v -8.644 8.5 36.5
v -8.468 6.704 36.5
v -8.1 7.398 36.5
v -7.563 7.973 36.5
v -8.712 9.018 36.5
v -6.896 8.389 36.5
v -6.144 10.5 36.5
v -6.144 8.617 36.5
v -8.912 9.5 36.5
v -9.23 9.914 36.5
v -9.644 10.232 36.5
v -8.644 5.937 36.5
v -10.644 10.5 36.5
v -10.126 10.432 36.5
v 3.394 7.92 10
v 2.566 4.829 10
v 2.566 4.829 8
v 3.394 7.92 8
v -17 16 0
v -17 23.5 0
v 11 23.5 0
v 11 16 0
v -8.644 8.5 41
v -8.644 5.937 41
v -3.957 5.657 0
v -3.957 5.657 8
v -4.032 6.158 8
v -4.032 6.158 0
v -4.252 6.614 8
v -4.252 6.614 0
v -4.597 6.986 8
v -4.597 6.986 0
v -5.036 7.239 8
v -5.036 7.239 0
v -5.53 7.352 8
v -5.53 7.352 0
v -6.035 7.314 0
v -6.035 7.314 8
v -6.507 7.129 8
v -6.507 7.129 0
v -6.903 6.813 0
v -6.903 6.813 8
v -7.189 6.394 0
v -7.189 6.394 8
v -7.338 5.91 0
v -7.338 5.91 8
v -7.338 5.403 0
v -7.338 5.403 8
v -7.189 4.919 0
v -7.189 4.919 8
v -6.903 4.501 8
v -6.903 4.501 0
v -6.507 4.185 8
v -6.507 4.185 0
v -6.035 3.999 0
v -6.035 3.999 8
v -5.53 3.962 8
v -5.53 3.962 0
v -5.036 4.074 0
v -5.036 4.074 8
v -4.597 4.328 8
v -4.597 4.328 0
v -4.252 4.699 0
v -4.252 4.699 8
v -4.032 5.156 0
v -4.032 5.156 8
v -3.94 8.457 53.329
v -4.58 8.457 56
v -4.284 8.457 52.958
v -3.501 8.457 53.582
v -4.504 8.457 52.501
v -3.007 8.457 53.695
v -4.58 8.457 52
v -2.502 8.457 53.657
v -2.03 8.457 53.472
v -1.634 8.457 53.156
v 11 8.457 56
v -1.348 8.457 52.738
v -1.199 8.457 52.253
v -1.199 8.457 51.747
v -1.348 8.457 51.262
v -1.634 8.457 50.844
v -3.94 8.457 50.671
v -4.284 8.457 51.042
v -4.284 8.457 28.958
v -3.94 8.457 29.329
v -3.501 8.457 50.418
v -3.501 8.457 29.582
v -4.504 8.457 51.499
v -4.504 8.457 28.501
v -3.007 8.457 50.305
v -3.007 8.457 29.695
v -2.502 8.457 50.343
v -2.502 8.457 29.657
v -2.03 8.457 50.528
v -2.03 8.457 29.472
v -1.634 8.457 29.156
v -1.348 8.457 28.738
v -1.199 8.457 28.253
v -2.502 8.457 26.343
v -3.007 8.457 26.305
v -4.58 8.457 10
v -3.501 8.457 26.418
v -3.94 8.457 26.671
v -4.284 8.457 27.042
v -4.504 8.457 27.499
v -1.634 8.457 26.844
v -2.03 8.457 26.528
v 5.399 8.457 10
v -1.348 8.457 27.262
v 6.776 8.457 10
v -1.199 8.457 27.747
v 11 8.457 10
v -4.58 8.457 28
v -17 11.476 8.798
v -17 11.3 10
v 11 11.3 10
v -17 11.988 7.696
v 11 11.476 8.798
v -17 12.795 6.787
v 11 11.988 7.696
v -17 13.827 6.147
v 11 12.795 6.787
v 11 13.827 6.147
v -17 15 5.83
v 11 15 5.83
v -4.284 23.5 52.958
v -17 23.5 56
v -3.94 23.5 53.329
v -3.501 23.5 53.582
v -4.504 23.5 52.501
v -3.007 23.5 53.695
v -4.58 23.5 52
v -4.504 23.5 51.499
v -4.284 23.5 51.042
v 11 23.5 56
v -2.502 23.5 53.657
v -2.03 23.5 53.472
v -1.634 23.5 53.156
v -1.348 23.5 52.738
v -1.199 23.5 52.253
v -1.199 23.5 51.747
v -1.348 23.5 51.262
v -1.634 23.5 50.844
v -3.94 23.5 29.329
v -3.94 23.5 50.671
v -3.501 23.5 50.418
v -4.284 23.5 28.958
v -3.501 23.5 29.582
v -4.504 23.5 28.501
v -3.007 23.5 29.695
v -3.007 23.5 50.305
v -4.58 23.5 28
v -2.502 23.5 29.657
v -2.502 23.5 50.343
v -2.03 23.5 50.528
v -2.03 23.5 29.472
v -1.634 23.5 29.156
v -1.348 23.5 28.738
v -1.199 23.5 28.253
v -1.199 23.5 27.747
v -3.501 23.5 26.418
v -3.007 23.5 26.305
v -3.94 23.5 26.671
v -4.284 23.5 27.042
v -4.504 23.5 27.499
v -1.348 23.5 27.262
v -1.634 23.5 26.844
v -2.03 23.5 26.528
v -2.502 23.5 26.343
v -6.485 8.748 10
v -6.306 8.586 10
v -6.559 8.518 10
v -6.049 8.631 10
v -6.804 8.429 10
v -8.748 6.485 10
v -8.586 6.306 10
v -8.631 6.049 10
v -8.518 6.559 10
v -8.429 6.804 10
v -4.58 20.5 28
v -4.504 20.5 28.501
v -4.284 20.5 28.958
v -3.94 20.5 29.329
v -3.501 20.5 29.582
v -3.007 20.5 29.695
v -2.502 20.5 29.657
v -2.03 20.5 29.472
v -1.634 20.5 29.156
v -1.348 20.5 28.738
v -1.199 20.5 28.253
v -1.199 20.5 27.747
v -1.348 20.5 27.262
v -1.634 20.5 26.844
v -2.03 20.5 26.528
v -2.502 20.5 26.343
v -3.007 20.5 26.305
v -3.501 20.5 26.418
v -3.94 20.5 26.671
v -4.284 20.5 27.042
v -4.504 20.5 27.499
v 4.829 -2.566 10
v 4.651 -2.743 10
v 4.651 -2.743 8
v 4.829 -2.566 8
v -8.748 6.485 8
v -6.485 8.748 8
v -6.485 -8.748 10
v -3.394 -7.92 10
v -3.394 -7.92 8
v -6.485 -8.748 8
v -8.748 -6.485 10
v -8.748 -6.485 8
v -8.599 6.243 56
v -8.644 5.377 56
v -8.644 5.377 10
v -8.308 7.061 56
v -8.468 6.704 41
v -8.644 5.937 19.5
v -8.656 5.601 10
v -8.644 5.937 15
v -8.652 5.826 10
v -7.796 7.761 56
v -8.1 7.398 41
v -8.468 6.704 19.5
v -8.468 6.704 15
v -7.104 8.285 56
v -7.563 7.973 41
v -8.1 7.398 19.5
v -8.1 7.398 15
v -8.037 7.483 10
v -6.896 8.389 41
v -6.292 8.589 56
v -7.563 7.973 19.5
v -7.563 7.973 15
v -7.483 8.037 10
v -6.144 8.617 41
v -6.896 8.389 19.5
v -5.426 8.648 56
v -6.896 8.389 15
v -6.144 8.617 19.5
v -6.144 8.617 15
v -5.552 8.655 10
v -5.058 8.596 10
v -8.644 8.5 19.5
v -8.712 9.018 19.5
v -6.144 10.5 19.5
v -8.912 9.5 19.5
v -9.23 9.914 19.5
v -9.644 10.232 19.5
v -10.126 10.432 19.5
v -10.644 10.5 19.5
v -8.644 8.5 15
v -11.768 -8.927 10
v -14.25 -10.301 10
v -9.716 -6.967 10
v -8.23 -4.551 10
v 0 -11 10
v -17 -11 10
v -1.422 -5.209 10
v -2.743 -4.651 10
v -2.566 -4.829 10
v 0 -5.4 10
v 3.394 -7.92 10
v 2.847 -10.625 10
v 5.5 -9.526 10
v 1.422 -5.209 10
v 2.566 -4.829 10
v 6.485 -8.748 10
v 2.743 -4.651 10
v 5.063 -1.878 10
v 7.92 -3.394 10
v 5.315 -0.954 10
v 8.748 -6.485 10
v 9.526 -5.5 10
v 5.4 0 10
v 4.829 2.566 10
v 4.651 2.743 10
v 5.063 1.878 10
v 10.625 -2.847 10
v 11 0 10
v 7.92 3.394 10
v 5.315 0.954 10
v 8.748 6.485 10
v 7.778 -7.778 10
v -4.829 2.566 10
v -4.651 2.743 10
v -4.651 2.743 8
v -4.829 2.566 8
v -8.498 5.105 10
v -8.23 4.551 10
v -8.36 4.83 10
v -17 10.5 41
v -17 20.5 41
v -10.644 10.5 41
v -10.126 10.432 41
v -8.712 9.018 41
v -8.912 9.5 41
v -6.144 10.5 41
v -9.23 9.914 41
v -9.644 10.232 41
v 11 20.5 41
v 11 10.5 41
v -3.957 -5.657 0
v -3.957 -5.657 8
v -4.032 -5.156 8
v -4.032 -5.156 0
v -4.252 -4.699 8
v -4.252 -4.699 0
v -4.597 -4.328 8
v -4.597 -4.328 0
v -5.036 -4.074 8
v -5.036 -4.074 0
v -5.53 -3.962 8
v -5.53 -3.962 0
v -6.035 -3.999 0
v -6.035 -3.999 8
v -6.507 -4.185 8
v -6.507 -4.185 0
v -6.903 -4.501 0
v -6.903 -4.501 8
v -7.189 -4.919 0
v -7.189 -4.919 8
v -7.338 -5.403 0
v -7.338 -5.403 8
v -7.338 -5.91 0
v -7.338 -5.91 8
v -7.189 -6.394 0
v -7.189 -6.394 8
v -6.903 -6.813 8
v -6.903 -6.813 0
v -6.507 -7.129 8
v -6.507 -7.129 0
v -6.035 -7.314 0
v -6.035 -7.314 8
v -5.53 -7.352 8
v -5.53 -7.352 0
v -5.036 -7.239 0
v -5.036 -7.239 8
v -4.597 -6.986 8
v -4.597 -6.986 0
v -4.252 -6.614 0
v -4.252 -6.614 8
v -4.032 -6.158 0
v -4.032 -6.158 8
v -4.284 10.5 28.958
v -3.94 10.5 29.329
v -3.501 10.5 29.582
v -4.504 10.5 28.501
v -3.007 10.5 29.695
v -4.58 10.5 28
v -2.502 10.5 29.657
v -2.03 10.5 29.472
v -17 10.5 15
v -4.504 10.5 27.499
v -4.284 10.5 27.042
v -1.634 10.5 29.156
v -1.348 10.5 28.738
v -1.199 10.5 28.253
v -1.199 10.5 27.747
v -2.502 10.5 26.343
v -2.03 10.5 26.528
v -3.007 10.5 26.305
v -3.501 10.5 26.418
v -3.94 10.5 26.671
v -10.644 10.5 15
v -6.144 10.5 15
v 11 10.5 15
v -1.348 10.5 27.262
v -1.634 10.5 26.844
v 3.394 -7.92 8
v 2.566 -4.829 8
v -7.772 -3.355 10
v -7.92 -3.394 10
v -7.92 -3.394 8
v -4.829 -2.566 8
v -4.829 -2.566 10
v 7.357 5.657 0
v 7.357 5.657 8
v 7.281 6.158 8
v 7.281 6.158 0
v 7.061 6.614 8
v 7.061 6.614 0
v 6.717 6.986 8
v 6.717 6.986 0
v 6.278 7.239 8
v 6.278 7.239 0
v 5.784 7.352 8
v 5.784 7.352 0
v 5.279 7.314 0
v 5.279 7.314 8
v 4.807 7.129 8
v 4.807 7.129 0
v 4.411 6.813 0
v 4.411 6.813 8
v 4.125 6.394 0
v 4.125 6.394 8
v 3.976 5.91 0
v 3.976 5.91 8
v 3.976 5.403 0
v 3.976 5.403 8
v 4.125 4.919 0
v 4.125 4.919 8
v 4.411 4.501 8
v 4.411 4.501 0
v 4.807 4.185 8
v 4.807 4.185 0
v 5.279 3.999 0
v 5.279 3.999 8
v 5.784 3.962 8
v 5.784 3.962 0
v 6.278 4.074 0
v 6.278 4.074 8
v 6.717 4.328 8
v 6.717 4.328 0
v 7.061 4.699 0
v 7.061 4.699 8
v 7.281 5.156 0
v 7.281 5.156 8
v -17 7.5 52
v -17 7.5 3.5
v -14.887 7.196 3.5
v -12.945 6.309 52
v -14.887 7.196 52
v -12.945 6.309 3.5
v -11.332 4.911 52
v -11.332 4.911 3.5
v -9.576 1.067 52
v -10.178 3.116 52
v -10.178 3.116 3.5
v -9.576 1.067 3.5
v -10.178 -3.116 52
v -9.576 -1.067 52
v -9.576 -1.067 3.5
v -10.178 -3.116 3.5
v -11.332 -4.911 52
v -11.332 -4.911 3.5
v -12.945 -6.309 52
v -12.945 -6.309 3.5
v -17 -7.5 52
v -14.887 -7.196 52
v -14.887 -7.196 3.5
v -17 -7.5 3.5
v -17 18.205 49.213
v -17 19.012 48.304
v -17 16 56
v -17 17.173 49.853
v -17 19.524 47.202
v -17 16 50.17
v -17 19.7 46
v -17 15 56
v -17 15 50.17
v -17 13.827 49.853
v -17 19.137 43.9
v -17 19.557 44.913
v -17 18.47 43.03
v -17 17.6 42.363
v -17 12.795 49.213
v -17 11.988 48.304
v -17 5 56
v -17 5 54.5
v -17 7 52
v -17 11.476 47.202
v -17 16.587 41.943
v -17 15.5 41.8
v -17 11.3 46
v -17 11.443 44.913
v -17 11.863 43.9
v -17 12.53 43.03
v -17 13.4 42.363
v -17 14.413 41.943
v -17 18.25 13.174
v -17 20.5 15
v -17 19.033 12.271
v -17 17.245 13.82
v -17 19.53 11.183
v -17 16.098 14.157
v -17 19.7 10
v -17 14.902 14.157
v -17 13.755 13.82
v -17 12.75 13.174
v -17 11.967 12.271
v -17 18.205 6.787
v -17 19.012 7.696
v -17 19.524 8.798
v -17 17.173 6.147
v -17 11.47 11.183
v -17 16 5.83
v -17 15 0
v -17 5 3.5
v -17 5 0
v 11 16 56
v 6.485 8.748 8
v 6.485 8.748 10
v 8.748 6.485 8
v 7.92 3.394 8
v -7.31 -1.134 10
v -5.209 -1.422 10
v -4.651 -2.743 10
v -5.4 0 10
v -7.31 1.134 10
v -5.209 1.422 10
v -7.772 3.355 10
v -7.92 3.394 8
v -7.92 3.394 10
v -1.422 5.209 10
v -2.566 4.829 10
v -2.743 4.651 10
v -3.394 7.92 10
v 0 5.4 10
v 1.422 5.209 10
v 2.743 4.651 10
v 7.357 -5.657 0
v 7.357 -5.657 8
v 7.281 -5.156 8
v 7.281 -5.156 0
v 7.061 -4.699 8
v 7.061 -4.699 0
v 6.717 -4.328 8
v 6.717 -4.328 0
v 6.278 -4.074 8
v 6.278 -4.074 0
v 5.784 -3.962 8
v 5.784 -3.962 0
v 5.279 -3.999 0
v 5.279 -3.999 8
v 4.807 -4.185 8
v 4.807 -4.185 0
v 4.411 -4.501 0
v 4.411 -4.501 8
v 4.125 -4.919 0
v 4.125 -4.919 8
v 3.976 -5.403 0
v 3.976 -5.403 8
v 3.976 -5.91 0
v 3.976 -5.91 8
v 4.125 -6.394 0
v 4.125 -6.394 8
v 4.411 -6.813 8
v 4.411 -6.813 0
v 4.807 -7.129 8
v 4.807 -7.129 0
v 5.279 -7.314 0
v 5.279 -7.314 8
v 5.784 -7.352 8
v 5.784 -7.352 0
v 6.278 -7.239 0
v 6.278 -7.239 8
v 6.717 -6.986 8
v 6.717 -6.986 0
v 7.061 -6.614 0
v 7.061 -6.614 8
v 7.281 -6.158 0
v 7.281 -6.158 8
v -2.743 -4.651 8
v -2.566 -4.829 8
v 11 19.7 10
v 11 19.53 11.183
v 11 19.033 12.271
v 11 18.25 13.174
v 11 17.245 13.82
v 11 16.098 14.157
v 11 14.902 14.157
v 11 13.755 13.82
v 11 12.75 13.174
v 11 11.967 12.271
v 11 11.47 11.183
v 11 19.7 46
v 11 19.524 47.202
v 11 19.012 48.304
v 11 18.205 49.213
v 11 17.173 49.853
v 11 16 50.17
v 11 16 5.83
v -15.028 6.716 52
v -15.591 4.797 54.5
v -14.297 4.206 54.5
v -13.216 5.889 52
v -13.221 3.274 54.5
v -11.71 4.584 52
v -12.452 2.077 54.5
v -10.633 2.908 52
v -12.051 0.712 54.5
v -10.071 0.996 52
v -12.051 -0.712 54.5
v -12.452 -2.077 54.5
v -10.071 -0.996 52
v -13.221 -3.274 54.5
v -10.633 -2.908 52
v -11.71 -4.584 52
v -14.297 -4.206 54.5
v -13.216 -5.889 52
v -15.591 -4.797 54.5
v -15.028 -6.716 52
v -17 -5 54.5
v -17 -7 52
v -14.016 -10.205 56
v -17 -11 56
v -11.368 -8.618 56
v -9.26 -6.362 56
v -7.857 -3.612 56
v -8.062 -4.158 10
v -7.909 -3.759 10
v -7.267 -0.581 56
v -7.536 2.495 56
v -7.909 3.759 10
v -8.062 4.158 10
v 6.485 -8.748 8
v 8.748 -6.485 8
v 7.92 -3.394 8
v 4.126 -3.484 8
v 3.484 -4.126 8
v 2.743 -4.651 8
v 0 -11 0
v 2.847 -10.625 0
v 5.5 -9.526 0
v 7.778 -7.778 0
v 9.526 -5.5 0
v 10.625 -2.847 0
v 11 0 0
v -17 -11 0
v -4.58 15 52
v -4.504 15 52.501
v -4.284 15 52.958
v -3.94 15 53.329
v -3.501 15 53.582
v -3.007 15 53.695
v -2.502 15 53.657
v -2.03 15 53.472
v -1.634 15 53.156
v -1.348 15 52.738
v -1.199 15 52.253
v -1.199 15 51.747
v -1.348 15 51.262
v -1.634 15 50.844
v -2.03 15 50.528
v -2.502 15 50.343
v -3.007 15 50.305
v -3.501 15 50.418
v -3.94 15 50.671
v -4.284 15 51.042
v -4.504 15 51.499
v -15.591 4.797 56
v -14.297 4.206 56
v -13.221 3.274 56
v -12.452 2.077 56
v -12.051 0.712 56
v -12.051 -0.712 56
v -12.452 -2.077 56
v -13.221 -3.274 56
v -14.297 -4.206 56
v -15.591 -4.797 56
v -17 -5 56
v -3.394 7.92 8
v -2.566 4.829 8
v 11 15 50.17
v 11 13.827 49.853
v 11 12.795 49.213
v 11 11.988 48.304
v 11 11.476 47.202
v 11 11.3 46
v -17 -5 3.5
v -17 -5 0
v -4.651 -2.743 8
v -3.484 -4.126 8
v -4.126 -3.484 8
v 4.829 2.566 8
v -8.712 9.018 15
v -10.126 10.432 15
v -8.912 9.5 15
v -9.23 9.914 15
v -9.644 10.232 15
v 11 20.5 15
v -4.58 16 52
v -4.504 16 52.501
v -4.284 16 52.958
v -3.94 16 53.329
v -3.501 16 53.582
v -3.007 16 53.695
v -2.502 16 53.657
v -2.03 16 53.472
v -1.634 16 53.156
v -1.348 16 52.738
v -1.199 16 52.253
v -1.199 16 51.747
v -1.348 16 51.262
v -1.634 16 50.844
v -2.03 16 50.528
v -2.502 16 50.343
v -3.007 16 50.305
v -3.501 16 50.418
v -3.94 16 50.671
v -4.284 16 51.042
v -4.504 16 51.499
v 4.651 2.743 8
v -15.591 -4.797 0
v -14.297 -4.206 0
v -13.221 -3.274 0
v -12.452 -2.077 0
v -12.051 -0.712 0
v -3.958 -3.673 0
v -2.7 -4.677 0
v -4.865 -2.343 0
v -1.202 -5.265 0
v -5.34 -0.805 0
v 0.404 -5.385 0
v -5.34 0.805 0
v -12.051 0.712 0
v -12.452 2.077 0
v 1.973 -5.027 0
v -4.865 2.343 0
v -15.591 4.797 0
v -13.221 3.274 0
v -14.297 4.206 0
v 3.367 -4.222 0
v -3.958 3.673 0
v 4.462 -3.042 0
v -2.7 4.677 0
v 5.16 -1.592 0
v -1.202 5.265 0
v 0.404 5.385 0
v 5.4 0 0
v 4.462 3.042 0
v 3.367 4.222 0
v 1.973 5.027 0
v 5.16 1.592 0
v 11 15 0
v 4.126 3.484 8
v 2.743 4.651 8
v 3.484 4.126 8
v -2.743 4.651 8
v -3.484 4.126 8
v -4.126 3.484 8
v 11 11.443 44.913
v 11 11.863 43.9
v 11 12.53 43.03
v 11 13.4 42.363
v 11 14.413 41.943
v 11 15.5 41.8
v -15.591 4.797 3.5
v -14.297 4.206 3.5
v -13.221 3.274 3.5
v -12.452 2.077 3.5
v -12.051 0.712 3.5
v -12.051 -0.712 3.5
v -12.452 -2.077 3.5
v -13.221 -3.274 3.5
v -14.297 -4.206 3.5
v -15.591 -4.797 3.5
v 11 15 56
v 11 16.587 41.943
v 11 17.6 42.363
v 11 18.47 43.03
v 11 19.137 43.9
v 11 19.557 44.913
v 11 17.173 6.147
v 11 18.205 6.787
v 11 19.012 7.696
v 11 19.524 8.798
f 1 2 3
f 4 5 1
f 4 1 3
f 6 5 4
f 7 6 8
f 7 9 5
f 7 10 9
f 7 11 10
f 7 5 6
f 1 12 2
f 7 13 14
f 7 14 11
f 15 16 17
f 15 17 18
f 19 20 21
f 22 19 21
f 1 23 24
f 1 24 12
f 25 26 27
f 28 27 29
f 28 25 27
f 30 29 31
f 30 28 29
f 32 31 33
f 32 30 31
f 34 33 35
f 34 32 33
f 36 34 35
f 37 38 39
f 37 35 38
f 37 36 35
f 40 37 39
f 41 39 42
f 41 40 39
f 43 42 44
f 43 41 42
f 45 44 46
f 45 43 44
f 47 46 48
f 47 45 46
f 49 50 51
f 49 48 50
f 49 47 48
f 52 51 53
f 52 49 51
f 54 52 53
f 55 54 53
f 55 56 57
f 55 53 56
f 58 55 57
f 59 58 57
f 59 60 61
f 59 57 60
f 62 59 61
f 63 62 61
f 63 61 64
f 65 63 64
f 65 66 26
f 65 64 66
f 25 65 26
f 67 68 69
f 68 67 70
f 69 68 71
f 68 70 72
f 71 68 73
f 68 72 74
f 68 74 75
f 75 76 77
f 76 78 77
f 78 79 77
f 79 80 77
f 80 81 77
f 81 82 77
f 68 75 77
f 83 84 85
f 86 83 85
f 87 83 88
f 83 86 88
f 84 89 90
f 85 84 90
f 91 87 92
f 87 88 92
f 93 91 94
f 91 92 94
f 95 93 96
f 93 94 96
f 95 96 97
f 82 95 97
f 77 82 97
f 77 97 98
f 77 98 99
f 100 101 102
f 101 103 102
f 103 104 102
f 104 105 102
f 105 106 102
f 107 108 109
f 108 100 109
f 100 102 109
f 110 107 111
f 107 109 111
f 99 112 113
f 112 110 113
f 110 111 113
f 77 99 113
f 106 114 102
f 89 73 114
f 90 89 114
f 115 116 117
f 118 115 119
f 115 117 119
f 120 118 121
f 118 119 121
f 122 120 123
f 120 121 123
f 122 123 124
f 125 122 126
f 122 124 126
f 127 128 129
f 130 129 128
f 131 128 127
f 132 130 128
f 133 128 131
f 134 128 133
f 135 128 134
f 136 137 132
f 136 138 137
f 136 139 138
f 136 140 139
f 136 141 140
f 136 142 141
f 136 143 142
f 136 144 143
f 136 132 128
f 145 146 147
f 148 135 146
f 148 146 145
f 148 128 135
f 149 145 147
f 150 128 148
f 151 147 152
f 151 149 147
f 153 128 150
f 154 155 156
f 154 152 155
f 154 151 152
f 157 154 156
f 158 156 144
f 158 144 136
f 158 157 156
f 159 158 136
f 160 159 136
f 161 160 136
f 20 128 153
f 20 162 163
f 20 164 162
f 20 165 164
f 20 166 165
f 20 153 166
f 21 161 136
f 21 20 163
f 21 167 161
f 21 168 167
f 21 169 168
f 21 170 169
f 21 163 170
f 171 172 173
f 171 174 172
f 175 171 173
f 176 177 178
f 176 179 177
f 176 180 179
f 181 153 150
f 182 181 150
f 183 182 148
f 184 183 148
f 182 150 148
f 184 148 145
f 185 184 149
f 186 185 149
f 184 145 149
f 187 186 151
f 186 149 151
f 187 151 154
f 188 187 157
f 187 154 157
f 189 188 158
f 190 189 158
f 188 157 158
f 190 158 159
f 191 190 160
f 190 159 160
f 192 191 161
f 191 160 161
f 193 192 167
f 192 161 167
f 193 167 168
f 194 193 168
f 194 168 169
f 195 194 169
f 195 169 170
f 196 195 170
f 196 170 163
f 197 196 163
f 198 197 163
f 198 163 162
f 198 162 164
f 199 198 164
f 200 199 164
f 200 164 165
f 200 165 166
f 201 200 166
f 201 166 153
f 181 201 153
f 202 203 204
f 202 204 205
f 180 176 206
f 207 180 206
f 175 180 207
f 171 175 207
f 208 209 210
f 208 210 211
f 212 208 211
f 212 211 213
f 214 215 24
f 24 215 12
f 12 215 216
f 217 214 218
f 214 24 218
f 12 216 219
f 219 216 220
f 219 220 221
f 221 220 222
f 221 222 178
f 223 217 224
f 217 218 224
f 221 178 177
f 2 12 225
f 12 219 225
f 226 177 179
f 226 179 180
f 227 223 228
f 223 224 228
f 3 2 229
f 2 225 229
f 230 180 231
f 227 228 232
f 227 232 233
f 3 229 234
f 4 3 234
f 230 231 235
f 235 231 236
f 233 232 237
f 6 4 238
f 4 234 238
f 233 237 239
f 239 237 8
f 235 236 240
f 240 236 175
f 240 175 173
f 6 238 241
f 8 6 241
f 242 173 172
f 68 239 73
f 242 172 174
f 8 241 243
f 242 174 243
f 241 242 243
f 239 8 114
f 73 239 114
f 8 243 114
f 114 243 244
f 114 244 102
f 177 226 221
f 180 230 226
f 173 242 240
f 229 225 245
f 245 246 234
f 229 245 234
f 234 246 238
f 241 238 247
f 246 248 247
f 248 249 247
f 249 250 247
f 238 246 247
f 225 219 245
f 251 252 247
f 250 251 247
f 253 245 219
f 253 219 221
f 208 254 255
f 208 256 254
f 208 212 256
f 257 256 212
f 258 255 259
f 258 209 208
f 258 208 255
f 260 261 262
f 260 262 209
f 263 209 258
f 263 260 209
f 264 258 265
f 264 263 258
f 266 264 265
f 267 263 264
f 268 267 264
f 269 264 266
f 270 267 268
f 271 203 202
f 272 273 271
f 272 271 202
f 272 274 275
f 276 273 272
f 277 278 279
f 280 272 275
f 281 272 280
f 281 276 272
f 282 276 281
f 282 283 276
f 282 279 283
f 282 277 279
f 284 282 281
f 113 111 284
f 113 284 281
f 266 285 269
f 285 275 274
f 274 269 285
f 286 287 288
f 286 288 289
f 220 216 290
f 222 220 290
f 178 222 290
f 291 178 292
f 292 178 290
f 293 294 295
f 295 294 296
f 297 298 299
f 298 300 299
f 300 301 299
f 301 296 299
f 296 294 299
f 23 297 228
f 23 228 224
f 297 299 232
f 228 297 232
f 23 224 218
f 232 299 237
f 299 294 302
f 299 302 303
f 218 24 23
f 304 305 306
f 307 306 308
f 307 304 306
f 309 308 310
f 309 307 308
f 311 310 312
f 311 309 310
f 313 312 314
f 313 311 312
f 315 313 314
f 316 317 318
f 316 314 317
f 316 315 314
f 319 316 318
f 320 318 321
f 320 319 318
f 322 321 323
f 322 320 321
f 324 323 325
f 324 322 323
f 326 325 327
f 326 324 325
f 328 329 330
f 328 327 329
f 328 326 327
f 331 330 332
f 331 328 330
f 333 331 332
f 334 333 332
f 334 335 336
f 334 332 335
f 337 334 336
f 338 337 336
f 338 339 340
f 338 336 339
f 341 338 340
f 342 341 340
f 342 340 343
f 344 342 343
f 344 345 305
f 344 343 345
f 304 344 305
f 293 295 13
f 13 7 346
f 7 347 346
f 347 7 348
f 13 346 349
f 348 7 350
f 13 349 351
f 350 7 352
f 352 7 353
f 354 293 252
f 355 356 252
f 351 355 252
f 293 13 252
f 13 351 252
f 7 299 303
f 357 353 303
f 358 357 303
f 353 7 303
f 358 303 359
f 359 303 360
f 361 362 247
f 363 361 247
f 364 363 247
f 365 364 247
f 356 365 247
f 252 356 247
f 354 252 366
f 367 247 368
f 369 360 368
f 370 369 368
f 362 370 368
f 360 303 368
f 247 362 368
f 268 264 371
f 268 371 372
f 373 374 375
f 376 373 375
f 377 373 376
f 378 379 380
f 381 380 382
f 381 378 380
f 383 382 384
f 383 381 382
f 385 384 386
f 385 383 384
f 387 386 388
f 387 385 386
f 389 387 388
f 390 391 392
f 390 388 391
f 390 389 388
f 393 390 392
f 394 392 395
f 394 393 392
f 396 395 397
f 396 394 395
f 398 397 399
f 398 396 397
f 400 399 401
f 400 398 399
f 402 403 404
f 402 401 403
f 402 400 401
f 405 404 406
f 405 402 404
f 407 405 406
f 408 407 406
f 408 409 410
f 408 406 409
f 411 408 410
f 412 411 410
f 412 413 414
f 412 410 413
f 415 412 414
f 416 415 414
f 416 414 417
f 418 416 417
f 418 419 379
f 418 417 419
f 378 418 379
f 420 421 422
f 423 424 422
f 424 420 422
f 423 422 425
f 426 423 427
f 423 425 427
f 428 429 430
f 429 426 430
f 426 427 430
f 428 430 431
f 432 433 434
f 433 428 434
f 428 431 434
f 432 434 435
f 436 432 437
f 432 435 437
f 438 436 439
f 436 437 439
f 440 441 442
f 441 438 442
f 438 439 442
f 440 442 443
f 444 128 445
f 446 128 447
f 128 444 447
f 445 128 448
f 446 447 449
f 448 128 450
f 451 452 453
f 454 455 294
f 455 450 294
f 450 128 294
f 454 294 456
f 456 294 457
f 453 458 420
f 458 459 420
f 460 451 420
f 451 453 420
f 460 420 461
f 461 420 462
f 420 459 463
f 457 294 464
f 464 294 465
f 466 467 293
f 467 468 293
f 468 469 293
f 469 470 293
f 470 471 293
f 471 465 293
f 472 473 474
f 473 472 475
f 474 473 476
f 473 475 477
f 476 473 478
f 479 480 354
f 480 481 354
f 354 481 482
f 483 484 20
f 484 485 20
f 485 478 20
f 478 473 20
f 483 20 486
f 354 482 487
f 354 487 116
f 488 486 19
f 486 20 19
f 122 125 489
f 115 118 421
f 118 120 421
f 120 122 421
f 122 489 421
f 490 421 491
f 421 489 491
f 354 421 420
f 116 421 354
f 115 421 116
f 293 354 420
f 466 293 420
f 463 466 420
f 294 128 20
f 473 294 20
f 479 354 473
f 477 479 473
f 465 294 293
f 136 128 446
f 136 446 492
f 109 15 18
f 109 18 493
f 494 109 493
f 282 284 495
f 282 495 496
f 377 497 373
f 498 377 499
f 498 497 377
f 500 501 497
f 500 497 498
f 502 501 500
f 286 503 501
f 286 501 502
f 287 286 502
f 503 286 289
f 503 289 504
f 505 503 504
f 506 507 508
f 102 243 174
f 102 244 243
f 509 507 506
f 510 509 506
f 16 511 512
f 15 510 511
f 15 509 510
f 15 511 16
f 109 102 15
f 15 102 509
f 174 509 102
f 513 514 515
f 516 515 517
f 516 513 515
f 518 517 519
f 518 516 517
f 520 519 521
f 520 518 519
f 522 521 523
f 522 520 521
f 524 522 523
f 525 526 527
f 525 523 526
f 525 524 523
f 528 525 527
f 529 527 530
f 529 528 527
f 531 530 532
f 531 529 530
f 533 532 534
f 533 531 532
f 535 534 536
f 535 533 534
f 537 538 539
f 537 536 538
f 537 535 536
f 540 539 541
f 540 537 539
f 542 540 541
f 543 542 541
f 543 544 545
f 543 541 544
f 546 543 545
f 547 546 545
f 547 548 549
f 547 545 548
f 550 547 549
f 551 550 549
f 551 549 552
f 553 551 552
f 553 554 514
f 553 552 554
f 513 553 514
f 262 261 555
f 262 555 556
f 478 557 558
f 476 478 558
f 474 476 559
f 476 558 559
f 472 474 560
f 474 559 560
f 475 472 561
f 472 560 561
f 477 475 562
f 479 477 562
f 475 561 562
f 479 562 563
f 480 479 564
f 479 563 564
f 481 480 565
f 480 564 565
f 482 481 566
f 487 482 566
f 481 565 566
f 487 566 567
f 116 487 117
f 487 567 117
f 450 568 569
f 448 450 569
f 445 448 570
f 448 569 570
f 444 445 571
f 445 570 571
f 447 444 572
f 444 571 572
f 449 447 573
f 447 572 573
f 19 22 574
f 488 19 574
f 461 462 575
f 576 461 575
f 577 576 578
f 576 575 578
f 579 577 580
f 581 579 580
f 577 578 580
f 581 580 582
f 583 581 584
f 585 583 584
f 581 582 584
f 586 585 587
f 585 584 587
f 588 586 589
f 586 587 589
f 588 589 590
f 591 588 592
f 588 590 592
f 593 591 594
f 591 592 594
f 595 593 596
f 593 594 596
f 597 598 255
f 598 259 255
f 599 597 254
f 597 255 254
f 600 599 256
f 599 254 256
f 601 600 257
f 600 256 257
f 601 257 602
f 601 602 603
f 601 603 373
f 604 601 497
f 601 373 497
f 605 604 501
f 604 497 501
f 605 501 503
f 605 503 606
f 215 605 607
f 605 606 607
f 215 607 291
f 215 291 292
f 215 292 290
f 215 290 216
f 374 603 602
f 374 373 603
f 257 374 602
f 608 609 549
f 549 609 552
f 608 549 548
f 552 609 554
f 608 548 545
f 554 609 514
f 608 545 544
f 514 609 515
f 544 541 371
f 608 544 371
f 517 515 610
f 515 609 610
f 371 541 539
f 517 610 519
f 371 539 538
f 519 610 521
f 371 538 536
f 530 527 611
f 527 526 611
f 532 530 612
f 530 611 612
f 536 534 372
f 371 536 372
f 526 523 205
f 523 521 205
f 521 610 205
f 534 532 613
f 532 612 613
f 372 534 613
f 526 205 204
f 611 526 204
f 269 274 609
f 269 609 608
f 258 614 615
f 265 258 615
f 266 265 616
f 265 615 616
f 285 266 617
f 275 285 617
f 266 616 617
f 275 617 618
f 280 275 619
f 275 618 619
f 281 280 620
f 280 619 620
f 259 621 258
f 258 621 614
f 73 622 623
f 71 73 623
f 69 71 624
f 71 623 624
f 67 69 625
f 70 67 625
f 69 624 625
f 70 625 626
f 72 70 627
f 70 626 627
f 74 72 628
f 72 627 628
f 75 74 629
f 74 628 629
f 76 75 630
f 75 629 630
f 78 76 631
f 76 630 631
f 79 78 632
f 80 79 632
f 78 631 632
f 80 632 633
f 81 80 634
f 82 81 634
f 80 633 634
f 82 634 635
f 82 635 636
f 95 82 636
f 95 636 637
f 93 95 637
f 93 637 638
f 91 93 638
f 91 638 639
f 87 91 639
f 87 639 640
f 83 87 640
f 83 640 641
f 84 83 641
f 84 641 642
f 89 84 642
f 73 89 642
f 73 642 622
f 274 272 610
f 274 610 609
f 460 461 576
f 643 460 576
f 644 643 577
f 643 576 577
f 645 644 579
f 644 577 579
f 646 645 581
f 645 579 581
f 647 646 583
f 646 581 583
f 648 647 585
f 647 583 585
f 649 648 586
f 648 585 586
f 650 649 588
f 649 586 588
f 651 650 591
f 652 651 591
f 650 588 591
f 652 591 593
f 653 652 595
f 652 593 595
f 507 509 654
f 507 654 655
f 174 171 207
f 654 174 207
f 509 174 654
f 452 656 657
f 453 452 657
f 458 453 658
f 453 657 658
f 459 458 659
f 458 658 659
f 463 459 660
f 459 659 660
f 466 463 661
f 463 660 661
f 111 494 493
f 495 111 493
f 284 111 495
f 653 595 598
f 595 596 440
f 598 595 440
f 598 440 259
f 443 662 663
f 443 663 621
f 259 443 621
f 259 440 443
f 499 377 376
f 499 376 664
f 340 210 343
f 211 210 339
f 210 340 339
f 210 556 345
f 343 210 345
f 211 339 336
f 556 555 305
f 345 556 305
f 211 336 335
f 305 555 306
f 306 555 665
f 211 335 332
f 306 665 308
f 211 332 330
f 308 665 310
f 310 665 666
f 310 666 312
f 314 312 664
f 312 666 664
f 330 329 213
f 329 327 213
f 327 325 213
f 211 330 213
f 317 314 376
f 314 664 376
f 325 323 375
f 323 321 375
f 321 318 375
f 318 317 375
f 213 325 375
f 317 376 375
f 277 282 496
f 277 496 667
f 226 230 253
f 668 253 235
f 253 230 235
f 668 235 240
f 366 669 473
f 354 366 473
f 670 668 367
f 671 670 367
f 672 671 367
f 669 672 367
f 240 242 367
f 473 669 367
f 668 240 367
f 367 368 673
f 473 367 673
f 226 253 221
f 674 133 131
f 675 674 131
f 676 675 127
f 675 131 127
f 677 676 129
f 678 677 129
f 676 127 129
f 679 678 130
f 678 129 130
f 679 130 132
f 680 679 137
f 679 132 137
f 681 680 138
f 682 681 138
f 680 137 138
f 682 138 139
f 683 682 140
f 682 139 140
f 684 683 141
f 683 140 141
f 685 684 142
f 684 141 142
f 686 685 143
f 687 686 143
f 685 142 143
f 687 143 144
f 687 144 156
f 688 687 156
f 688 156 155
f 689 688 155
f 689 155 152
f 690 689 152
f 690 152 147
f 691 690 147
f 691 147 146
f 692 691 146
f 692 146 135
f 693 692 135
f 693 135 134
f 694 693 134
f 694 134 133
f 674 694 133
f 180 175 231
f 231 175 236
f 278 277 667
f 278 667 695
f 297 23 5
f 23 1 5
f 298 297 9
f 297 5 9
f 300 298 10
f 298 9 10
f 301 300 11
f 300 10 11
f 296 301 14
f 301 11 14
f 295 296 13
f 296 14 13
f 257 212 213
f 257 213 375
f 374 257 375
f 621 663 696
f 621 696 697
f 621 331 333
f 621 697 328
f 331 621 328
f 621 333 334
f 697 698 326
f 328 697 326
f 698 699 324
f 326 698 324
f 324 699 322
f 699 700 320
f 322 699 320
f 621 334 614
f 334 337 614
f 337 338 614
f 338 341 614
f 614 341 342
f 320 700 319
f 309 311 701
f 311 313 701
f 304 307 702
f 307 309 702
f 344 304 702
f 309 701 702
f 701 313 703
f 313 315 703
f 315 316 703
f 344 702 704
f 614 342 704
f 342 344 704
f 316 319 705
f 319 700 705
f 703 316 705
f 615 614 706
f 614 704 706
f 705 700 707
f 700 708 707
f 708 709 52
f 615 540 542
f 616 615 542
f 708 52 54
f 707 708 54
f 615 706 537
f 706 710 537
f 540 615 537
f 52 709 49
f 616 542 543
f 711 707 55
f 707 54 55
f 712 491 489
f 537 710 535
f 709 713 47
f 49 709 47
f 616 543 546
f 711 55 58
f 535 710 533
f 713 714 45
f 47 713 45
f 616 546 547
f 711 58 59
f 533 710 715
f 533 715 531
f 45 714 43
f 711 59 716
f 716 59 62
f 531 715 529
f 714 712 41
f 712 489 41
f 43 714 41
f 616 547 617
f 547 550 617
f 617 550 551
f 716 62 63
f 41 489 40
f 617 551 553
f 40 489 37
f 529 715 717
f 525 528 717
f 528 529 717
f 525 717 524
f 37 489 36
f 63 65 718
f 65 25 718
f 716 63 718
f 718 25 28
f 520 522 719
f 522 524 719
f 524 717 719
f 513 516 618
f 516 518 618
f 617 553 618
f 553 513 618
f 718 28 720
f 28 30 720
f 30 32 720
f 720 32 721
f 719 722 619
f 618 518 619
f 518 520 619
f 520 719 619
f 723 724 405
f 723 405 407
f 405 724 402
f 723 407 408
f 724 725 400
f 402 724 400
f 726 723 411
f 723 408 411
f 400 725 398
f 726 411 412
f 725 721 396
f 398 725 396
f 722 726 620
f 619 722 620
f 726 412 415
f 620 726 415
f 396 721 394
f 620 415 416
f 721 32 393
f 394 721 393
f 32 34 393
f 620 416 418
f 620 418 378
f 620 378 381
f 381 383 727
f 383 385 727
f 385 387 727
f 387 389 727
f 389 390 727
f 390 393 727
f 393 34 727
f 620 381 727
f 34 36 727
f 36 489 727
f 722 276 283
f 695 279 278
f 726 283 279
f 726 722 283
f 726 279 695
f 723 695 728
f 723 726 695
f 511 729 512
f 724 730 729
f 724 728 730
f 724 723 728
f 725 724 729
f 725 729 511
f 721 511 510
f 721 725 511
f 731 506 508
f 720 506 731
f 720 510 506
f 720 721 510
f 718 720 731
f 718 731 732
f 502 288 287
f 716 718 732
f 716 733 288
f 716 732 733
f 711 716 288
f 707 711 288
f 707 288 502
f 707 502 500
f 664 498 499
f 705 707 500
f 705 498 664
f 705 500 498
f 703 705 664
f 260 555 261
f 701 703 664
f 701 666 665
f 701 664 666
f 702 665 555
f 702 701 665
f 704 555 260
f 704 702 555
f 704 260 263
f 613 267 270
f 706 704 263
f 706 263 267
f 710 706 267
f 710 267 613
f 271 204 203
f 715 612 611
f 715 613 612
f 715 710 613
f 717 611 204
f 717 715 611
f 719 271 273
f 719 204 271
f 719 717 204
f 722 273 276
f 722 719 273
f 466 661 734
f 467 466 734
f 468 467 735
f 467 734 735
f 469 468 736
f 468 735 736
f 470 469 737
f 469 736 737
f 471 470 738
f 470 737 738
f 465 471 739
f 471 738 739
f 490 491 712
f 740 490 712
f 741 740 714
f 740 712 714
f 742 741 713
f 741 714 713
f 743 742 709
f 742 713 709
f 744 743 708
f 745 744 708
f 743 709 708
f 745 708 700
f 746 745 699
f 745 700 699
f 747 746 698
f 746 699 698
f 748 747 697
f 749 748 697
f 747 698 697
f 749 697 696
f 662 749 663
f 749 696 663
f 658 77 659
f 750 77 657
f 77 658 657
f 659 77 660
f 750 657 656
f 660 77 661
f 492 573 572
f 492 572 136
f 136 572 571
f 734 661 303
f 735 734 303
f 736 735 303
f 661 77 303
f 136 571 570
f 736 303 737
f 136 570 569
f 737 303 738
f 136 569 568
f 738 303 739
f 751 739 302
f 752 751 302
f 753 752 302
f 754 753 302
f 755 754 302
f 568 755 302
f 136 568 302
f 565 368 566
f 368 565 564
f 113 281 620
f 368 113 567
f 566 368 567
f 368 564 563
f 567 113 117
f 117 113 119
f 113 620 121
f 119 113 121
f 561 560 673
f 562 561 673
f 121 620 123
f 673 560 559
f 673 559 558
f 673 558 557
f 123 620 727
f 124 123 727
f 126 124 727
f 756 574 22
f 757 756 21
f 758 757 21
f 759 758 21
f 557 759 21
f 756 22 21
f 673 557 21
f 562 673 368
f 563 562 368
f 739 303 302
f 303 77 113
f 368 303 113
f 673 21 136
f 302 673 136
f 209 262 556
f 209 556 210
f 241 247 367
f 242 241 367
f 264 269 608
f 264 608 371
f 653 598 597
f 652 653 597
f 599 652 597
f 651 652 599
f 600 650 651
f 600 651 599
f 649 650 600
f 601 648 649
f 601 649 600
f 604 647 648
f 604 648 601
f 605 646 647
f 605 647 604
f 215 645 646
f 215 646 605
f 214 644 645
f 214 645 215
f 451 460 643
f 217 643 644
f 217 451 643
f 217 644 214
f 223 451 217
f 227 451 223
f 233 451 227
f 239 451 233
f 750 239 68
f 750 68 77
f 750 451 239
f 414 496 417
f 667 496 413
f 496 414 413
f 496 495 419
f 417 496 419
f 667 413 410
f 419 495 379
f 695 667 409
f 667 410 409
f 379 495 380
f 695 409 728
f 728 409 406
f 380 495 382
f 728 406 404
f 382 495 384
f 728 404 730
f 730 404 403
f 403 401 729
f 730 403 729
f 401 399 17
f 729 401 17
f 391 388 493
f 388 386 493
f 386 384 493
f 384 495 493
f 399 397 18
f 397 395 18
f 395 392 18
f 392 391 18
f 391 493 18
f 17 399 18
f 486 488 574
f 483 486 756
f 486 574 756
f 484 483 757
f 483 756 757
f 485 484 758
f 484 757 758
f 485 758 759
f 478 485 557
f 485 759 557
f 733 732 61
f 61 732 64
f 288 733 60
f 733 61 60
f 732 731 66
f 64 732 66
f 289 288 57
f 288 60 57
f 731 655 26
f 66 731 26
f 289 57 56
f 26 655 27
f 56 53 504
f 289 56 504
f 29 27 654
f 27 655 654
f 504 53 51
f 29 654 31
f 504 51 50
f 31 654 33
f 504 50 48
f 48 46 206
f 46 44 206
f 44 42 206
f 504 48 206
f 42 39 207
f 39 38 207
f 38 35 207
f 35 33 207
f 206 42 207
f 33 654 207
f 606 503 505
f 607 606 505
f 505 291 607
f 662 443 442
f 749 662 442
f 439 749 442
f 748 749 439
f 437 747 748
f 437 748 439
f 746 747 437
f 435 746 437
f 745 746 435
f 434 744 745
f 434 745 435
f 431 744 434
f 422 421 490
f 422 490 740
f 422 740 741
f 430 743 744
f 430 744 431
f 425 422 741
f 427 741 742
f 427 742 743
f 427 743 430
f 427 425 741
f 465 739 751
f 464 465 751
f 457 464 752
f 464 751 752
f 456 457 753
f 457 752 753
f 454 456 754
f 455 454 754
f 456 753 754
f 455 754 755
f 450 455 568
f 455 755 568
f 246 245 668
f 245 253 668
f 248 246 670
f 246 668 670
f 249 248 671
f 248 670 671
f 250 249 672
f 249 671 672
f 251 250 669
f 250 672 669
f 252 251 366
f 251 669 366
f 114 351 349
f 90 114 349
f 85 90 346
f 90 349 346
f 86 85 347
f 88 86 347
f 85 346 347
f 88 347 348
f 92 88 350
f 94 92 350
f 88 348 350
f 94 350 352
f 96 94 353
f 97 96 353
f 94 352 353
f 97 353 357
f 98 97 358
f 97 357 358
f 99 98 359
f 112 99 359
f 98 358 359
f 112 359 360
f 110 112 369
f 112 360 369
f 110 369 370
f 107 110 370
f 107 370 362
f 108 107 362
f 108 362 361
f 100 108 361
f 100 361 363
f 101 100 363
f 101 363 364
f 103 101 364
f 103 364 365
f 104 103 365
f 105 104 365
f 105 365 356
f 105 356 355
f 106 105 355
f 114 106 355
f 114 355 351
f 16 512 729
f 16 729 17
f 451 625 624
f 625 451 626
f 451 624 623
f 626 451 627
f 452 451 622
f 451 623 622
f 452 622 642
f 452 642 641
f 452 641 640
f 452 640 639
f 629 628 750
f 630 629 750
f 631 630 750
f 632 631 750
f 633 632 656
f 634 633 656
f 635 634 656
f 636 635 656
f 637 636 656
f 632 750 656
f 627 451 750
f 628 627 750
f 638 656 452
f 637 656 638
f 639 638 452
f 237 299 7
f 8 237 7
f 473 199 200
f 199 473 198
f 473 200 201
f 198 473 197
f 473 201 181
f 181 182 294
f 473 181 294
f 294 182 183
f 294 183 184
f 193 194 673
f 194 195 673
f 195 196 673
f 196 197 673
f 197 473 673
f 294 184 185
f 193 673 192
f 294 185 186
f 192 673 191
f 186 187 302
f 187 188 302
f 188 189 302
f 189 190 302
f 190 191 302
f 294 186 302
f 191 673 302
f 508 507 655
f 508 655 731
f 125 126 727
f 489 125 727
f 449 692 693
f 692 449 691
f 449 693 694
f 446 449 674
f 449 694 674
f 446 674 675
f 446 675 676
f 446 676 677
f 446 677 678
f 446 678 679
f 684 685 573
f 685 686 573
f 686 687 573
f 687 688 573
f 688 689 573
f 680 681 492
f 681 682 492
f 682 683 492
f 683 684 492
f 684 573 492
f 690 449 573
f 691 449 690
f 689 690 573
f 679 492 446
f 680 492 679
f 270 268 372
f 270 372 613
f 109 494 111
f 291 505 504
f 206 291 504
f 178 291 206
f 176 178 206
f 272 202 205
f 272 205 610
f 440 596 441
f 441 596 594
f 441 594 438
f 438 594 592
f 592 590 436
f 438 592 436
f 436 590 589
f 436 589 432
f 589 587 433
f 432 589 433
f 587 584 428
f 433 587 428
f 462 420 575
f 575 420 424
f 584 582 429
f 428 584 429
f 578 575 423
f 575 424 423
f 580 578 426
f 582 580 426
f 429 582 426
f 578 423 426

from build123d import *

# Parameters (mm, degrees)
SKETCH_1_R          = 1.7
SKETCH_1_R_2        = 5.4
EXTRUDE_1_DEPTH     = 10
EXTRUDE_START       = 10
EXTRUDE_2_DEPTH     = 10
CUT_EXTRUDE_START   = -10
CUT_EXTRUDE_1_DEPTH = 2
EXTRUDE_START_2     = 20
EXTRUDE_3_DEPTH     = 36
EXTRUDE_4_DEPTH     = 3.5
EXTRUDE_START_3     = 52
EXTRUDE_5_DEPTH     = 4
CUT_EXTRUDE_2_REACH = 69.936
SKETCH_7_R          = 1.7
SKETCH_7_W          = 2.5
SKETCH_7_H          = 4.5
SKETCH_8_W          = 26
SKETCH_8_H          = 10
CUT_EXTRUDE_3_DEPTH = 67.874883177
SKETCH_9_W          = 2.5
SKETCH_9_H          = 4.5
EXTRUDE_10_DEPTH    = 3
FILLET_1_R          = 2
CHAMFER_3_SIZE      = 2.5
CHAMFER_3_SIZE2     = 2


with BuildPart() as part:
    # 草图1 → 凸台-拉伸1 (new body)
    with BuildSketch(Plane.XY):
        with BuildLine():
            Line((-17, -7.5), (-17, -11))
            Line((-17, -11), (0, -11))
            ThreePointArc((0, -11), (7.778174593, -7.778174593), (11, 0))
            Line((11, 0), (11, 23.5))
            Line((11, 23.5), (-17, 23.5))
            Line((-17, 23.5), (-17, 7.5))
            ThreePointArc((-17, 7.5), (-9.5, 0), (-17, -7.5))
        make_face()
        with Locations((-5.656854249, -5.656854249)):
            Circle(SKETCH_1_R, mode=Mode.SUBTRACT)
        with Locations((5.656854249, -5.656854249)):
            Circle(SKETCH_1_R, mode=Mode.SUBTRACT)
        Circle(SKETCH_1_R_2, mode=Mode.SUBTRACT)
        with Locations((-5.656854249, 5.656854249)):
            Circle(SKETCH_1_R, mode=Mode.SUBTRACT)
        with Locations((5.656854249, 5.656854249)):
            Circle(SKETCH_1_R, mode=Mode.SUBTRACT)
    extrude(amount=EXTRUDE_1_DEPTH)

    # 草图1<6> → 凸台-拉伸2 (add)
    with BuildSketch(Plane.XY.offset(EXTRUDE_START)):
        with BuildLine():
            Line((11, 8.456854249), (11, 23.5))
            Line((11, 23.5), (-17, 23.5))
            Line((-17, 23.5), (-17, 7.5))
            ThreePointArc((-17, 7.5), (-9.5, 0), (-17, -7.5))
            Line((-17, -7.5), (-17, -11))
            ThreePointArc((-17, -11), (-8.462447466, -5.036106671), (-8.643737412, 5.376624039))
            ThreePointArc((-8.643737412, 5.376624039), (-7.46899014, 8.047704206), (-4.579821288, 8.456854249))
            Line((-4.579821288, 8.456854249), (11, 8.456854249))
        make_face()
    extrude(amount=EXTRUDE_2_DEPTH)

    # 草图3 → 切除-拉伸1 (cut)
    with BuildSketch(Plane(origin=(0, 0, 0), x_dir=(-1, 0, 0), z_dir=(0, 0, -1)).offset(CUT_EXTRUDE_START)):
        Polygon((7.919595949, 3.39411255), (8.747816894, 6.485075194), (6.485075194, 8.747816894), (3.39411255, 7.919595949), (2.565891605, 4.828633305), (4.828633305, 2.565891605), align=None)
        Polygon((-2.565891605, 4.828633305), (-3.39411255, 7.919595949), (-6.485075194, 8.747816894), (-8.747816894, 6.485075194), (-7.919595949, 3.39411255), (-4.828633305, 2.565891605), align=None)
        Polygon((-3.39411255, -7.919595949), (-2.565891605, -4.828633305), (-4.828633305, -2.565891605), (-7.919595949, -3.39411255), (-8.747816894, -6.485075194), (-6.485075194, -8.747816894), align=None)
        Polygon((2.565891605, -4.828633305), (3.39411255, -7.919595949), (6.485075194, -8.747816894), (8.747816894, -6.485075194), (7.919595949, -3.39411255), (4.828633305, -2.565891605), align=None)
    extrude(amount=CUT_EXTRUDE_1_DEPTH, mode=Mode.SUBTRACT)

    # 草图1<7> → 凸台-拉伸3 (add)
    with BuildSketch(Plane.XY.offset(EXTRUDE_START_2)):
        with BuildLine():
            Line((11, 8.456854249), (11, 23.5))
            Line((11, 23.5), (-17, 23.5))
            Line((-17, 23.5), (-17, 7.5))
            ThreePointArc((-17, 7.5), (-9.5, 0), (-17, -7.5))
            Line((-17, -7.5), (-17, -11))
            ThreePointArc((-17, -11), (-8.462447466, -5.036106671), (-8.643737412, 5.376624039))
            ThreePointArc((-8.643737412, 5.376624039), (-7.46899014, 8.047704206), (-4.579821288, 8.456854249))
            Line((-4.579821288, 8.456854249), (11, 8.456854249))
        make_face()
    extrude(amount=EXTRUDE_3_DEPTH)

    # 草图1<8> → 凸台-拉伸4 (add)
    with BuildSketch(Plane.XY):
        with BuildLine():
            Line((-17, -5), (-17, -7.5))
            ThreePointArc((-17, -7.5), (-9.5, 0), (-17, 7.5))
            Line((-17, 7.5), (-17, 5))
            ThreePointArc((-17, 5), (-12, 0), (-17, -5))
        make_face()
    extrude(amount=EXTRUDE_4_DEPTH)

    # 草图1<9> → 凸台-拉伸5 (add)
    with BuildSketch(Plane.XY.offset(EXTRUDE_START_3)):
        with BuildLine():
            Line((-17, -5), (-17, -7.5))
            ThreePointArc((-17, -7.5), (-9.5, 0), (-17, 7.5))
            Line((-17, 7.5), (-17, 5))
            ThreePointArc((-17, 5), (-12, 0), (-17, -5))
        make_face()
    extrude(amount=EXTRUDE_5_DEPTH)

    # 草图7 → 切除-拉伸2 (cut, up to next)
    with BuildSketch(Plane(origin=(0, 23.5, 0), x_dir=(1, 0, 0), z_dir=(0, 1, 0)), mode=Mode.PRIVATE) as cut_extrude_2_sk1:
        with Locations(Location((-2.879821288, -28, 0), (0, 0, 180))):
            Circle(SKETCH_7_R)
    cut_extrude_2_tool1 = extrude(cut_extrude_2_sk1.sketch, amount=-CUT_EXTRUDE_2_REACH, mode=Mode.PRIVATE) & part.part
    # 草图7 → 切除-拉伸2 (cut, up to next)
    with BuildSketch(Plane(origin=(0, 23.5, 0), x_dir=(1, 0, 0), z_dir=(0, 1, 0)), mode=Mode.PRIVATE) as cut_extrude_2_sk2:
        with Locations(Location((-2.879821288, -52, 0), (0, 0, 180))):
            Circle(SKETCH_7_R)
    cut_extrude_2_tool2 = extrude(cut_extrude_2_sk2.sketch, amount=-CUT_EXTRUDE_2_REACH, mode=Mode.PRIVATE) & part.part
    # 草图7 → 切除-拉伸2 (cut, up to next)
    with BuildSketch(Plane(origin=(0, 23.5, 0), x_dir=(1, 0, 0), z_dir=(0, 1, 0)), mode=Mode.PRIVATE) as cut_extrude_2_sk3:
        with Locations((-7.393737412, -38.75)):
            Rectangle(SKETCH_7_W, SKETCH_7_H)
    cut_extrude_2_tool3 = extrude(cut_extrude_2_sk3.sketch, amount=-CUT_EXTRUDE_2_REACH, mode=Mode.PRIVATE) & part.part
    # 草图7 → 切除-拉伸2 (cut, up to next)
    with BuildSketch(Plane(origin=(0, 23.5, 0), x_dir=(1, 0, 0), z_dir=(0, 1, 0)), mode=Mode.PRIVATE) as cut_extrude_2_sk4:
        with Locations((-7.393737412, -17.25)):
            Rectangle(SKETCH_7_W, SKETCH_7_H)
    cut_extrude_2_tool4 = extrude(cut_extrude_2_sk4.sketch, amount=-CUT_EXTRUDE_2_REACH, mode=Mode.PRIVATE) & part.part
    add(cut_extrude_2_tool1.solids().sort_by_distance((-2.879821, 23.5, 28))[0], mode=Mode.SUBTRACT)
    add(cut_extrude_2_tool2.solids().sort_by_distance((-2.879821, 23.5, 52))[0], mode=Mode.SUBTRACT)
    add(cut_extrude_2_tool3.solids().sort_by_distance((-7.393737, 23.5, 38.75))[0], mode=Mode.SUBTRACT)
    add(cut_extrude_2_tool4.solids().sort_by_distance((-7.393737, 23.5, 17.25))[0], mode=Mode.SUBTRACT)

    # 草图8 → 切除-拉伸3 (cut, through all)
    with BuildSketch(Plane(origin=(11, 0, 0), x_dir=(0, 0, -1), z_dir=(1, 0, 0))):
        with Locations((18, 15.5)):
            Rectangle(SKETCH_8_W, SKETCH_8_H)
        with BuildLine():
            ThreePointArc((-46, 19.7), (-48.787471973, 18.641655614), (-50.170131892, 16))
            ThreePointArc((-50.170131892, 16), (-50.2, 15.5), (-50.170131892, 15))
            ThreePointArc((-50.170131892, 15), (-48.787471973, 12.358344386), (-46, 11.3))
            Line((-46, 11.3), (-46, 19.7))
        make_face()
        with BuildLine():
            ThreePointArc((-41.8, 15.5), (-43.030151519, 18.469848481), (-46, 19.7))
            Line((-46, 19.7), (-46, 11.3))
            ThreePointArc((-46, 11.3), (-43.030151519, 12.530151519), (-41.8, 15.5))
        make_face()
        with BuildLine():
            ThreePointArc((-10, 11.3), (-7.212528027, 12.358344386), (-5.829868108, 15))
            ThreePointArc((-5.829868108, 15), (-5.807473676, 15.249554345), (-5.8, 15.5))
            ThreePointArc((-5.8, 15.5), (-5.807473676, 15.750445655), (-5.829868108, 16))
            ThreePointArc((-5.829868108, 16), (-7.212528027, 18.641655614), (-10, 19.7))
            Line((-10, 19.7), (-10, 11.3))
        make_face()
        with BuildLine():
            ThreePointArc((-10, 19.7), (-14.2, 15.5), (-10, 11.3))
            Line((-10, 11.3), (-10, 19.7))
        make_face()
        with BuildLine():
            Line((-50.170131892, 16), (-56, 16))
            Line((-56, 16), (-56, 15))
            Line((-56, 15), (-50.170131892, 15))
            ThreePointArc((-50.170131892, 15), (-50.2, 15.5), (-50.170131892, 16))
        make_face()
        with BuildLine():
            ThreePointArc((-5.8, 15.5), (-5.807473676, 15.249554345), (-5.829868108, 15))
            Line((-5.829868108, 15), (0, 15))
            Line((0, 15), (0, 16))
            Line((0, 16), (-5.829868108, 16))
            ThreePointArc((-5.829868108, 16), (-5.807473676, 15.750445655), (-5.8, 15.5))
        make_face()
        Polygon((-41, 10.5), (-28, 15.5), (-41, 20.5), align=None)
        Polygon((-28, 15.5), (-15, 20.5), (-41, 20.5), align=None)
        Polygon((-15, 10.5), (-15, 20.5), (-28, 15.5), align=None)
        Polygon((-15, 10.5), (-28, 15.5), (-41, 10.5), align=None)
    extrude(amount=-CUT_EXTRUDE_3_DEPTH, mode=Mode.SUBTRACT)

    # 草图9 → 凸台-拉伸10 (add)
    with BuildSketch(Plane(origin=(0, 23.5, 0), x_dir=(1, 0, 0), z_dir=(0, 1, 0))):
        with Locations((-7.393737412, -17.25)):
            Rectangle(SKETCH_9_W, SKETCH_9_H)
        with Locations((-7.393737412, -38.75)):
            Rectangle(SKETCH_9_W, SKETCH_9_H)
    extrude(amount=-EXTRUDE_10_DEPTH)

    # 圆角1
    fillet_1_edges = [part.edges().sort_by_distance(p)[0] for p in [
        (-8.643737412, 10.5, 38.75),
        (-8.643737412, 10.5, 17.25),
    ]]
    fillet(fillet_1_edges, radius=FILLET_1_R)

    # 倒角3
    chamfer_3_edges = [part.edges().sort_by_distance(p)[0] for p in [
        (-12, 0, 52),
    ]]
    chamfer_3_side = [part.faces().sort_by_distance(p)[0] for p in [
        (-12, 0, 54),
    ]]
    chamfer(chamfer_3_edges, length=CHAMFER_3_SIZE, length2=CHAMFER_3_SIZE2, reference=chamfer_3_side[0])


solid = part.part
